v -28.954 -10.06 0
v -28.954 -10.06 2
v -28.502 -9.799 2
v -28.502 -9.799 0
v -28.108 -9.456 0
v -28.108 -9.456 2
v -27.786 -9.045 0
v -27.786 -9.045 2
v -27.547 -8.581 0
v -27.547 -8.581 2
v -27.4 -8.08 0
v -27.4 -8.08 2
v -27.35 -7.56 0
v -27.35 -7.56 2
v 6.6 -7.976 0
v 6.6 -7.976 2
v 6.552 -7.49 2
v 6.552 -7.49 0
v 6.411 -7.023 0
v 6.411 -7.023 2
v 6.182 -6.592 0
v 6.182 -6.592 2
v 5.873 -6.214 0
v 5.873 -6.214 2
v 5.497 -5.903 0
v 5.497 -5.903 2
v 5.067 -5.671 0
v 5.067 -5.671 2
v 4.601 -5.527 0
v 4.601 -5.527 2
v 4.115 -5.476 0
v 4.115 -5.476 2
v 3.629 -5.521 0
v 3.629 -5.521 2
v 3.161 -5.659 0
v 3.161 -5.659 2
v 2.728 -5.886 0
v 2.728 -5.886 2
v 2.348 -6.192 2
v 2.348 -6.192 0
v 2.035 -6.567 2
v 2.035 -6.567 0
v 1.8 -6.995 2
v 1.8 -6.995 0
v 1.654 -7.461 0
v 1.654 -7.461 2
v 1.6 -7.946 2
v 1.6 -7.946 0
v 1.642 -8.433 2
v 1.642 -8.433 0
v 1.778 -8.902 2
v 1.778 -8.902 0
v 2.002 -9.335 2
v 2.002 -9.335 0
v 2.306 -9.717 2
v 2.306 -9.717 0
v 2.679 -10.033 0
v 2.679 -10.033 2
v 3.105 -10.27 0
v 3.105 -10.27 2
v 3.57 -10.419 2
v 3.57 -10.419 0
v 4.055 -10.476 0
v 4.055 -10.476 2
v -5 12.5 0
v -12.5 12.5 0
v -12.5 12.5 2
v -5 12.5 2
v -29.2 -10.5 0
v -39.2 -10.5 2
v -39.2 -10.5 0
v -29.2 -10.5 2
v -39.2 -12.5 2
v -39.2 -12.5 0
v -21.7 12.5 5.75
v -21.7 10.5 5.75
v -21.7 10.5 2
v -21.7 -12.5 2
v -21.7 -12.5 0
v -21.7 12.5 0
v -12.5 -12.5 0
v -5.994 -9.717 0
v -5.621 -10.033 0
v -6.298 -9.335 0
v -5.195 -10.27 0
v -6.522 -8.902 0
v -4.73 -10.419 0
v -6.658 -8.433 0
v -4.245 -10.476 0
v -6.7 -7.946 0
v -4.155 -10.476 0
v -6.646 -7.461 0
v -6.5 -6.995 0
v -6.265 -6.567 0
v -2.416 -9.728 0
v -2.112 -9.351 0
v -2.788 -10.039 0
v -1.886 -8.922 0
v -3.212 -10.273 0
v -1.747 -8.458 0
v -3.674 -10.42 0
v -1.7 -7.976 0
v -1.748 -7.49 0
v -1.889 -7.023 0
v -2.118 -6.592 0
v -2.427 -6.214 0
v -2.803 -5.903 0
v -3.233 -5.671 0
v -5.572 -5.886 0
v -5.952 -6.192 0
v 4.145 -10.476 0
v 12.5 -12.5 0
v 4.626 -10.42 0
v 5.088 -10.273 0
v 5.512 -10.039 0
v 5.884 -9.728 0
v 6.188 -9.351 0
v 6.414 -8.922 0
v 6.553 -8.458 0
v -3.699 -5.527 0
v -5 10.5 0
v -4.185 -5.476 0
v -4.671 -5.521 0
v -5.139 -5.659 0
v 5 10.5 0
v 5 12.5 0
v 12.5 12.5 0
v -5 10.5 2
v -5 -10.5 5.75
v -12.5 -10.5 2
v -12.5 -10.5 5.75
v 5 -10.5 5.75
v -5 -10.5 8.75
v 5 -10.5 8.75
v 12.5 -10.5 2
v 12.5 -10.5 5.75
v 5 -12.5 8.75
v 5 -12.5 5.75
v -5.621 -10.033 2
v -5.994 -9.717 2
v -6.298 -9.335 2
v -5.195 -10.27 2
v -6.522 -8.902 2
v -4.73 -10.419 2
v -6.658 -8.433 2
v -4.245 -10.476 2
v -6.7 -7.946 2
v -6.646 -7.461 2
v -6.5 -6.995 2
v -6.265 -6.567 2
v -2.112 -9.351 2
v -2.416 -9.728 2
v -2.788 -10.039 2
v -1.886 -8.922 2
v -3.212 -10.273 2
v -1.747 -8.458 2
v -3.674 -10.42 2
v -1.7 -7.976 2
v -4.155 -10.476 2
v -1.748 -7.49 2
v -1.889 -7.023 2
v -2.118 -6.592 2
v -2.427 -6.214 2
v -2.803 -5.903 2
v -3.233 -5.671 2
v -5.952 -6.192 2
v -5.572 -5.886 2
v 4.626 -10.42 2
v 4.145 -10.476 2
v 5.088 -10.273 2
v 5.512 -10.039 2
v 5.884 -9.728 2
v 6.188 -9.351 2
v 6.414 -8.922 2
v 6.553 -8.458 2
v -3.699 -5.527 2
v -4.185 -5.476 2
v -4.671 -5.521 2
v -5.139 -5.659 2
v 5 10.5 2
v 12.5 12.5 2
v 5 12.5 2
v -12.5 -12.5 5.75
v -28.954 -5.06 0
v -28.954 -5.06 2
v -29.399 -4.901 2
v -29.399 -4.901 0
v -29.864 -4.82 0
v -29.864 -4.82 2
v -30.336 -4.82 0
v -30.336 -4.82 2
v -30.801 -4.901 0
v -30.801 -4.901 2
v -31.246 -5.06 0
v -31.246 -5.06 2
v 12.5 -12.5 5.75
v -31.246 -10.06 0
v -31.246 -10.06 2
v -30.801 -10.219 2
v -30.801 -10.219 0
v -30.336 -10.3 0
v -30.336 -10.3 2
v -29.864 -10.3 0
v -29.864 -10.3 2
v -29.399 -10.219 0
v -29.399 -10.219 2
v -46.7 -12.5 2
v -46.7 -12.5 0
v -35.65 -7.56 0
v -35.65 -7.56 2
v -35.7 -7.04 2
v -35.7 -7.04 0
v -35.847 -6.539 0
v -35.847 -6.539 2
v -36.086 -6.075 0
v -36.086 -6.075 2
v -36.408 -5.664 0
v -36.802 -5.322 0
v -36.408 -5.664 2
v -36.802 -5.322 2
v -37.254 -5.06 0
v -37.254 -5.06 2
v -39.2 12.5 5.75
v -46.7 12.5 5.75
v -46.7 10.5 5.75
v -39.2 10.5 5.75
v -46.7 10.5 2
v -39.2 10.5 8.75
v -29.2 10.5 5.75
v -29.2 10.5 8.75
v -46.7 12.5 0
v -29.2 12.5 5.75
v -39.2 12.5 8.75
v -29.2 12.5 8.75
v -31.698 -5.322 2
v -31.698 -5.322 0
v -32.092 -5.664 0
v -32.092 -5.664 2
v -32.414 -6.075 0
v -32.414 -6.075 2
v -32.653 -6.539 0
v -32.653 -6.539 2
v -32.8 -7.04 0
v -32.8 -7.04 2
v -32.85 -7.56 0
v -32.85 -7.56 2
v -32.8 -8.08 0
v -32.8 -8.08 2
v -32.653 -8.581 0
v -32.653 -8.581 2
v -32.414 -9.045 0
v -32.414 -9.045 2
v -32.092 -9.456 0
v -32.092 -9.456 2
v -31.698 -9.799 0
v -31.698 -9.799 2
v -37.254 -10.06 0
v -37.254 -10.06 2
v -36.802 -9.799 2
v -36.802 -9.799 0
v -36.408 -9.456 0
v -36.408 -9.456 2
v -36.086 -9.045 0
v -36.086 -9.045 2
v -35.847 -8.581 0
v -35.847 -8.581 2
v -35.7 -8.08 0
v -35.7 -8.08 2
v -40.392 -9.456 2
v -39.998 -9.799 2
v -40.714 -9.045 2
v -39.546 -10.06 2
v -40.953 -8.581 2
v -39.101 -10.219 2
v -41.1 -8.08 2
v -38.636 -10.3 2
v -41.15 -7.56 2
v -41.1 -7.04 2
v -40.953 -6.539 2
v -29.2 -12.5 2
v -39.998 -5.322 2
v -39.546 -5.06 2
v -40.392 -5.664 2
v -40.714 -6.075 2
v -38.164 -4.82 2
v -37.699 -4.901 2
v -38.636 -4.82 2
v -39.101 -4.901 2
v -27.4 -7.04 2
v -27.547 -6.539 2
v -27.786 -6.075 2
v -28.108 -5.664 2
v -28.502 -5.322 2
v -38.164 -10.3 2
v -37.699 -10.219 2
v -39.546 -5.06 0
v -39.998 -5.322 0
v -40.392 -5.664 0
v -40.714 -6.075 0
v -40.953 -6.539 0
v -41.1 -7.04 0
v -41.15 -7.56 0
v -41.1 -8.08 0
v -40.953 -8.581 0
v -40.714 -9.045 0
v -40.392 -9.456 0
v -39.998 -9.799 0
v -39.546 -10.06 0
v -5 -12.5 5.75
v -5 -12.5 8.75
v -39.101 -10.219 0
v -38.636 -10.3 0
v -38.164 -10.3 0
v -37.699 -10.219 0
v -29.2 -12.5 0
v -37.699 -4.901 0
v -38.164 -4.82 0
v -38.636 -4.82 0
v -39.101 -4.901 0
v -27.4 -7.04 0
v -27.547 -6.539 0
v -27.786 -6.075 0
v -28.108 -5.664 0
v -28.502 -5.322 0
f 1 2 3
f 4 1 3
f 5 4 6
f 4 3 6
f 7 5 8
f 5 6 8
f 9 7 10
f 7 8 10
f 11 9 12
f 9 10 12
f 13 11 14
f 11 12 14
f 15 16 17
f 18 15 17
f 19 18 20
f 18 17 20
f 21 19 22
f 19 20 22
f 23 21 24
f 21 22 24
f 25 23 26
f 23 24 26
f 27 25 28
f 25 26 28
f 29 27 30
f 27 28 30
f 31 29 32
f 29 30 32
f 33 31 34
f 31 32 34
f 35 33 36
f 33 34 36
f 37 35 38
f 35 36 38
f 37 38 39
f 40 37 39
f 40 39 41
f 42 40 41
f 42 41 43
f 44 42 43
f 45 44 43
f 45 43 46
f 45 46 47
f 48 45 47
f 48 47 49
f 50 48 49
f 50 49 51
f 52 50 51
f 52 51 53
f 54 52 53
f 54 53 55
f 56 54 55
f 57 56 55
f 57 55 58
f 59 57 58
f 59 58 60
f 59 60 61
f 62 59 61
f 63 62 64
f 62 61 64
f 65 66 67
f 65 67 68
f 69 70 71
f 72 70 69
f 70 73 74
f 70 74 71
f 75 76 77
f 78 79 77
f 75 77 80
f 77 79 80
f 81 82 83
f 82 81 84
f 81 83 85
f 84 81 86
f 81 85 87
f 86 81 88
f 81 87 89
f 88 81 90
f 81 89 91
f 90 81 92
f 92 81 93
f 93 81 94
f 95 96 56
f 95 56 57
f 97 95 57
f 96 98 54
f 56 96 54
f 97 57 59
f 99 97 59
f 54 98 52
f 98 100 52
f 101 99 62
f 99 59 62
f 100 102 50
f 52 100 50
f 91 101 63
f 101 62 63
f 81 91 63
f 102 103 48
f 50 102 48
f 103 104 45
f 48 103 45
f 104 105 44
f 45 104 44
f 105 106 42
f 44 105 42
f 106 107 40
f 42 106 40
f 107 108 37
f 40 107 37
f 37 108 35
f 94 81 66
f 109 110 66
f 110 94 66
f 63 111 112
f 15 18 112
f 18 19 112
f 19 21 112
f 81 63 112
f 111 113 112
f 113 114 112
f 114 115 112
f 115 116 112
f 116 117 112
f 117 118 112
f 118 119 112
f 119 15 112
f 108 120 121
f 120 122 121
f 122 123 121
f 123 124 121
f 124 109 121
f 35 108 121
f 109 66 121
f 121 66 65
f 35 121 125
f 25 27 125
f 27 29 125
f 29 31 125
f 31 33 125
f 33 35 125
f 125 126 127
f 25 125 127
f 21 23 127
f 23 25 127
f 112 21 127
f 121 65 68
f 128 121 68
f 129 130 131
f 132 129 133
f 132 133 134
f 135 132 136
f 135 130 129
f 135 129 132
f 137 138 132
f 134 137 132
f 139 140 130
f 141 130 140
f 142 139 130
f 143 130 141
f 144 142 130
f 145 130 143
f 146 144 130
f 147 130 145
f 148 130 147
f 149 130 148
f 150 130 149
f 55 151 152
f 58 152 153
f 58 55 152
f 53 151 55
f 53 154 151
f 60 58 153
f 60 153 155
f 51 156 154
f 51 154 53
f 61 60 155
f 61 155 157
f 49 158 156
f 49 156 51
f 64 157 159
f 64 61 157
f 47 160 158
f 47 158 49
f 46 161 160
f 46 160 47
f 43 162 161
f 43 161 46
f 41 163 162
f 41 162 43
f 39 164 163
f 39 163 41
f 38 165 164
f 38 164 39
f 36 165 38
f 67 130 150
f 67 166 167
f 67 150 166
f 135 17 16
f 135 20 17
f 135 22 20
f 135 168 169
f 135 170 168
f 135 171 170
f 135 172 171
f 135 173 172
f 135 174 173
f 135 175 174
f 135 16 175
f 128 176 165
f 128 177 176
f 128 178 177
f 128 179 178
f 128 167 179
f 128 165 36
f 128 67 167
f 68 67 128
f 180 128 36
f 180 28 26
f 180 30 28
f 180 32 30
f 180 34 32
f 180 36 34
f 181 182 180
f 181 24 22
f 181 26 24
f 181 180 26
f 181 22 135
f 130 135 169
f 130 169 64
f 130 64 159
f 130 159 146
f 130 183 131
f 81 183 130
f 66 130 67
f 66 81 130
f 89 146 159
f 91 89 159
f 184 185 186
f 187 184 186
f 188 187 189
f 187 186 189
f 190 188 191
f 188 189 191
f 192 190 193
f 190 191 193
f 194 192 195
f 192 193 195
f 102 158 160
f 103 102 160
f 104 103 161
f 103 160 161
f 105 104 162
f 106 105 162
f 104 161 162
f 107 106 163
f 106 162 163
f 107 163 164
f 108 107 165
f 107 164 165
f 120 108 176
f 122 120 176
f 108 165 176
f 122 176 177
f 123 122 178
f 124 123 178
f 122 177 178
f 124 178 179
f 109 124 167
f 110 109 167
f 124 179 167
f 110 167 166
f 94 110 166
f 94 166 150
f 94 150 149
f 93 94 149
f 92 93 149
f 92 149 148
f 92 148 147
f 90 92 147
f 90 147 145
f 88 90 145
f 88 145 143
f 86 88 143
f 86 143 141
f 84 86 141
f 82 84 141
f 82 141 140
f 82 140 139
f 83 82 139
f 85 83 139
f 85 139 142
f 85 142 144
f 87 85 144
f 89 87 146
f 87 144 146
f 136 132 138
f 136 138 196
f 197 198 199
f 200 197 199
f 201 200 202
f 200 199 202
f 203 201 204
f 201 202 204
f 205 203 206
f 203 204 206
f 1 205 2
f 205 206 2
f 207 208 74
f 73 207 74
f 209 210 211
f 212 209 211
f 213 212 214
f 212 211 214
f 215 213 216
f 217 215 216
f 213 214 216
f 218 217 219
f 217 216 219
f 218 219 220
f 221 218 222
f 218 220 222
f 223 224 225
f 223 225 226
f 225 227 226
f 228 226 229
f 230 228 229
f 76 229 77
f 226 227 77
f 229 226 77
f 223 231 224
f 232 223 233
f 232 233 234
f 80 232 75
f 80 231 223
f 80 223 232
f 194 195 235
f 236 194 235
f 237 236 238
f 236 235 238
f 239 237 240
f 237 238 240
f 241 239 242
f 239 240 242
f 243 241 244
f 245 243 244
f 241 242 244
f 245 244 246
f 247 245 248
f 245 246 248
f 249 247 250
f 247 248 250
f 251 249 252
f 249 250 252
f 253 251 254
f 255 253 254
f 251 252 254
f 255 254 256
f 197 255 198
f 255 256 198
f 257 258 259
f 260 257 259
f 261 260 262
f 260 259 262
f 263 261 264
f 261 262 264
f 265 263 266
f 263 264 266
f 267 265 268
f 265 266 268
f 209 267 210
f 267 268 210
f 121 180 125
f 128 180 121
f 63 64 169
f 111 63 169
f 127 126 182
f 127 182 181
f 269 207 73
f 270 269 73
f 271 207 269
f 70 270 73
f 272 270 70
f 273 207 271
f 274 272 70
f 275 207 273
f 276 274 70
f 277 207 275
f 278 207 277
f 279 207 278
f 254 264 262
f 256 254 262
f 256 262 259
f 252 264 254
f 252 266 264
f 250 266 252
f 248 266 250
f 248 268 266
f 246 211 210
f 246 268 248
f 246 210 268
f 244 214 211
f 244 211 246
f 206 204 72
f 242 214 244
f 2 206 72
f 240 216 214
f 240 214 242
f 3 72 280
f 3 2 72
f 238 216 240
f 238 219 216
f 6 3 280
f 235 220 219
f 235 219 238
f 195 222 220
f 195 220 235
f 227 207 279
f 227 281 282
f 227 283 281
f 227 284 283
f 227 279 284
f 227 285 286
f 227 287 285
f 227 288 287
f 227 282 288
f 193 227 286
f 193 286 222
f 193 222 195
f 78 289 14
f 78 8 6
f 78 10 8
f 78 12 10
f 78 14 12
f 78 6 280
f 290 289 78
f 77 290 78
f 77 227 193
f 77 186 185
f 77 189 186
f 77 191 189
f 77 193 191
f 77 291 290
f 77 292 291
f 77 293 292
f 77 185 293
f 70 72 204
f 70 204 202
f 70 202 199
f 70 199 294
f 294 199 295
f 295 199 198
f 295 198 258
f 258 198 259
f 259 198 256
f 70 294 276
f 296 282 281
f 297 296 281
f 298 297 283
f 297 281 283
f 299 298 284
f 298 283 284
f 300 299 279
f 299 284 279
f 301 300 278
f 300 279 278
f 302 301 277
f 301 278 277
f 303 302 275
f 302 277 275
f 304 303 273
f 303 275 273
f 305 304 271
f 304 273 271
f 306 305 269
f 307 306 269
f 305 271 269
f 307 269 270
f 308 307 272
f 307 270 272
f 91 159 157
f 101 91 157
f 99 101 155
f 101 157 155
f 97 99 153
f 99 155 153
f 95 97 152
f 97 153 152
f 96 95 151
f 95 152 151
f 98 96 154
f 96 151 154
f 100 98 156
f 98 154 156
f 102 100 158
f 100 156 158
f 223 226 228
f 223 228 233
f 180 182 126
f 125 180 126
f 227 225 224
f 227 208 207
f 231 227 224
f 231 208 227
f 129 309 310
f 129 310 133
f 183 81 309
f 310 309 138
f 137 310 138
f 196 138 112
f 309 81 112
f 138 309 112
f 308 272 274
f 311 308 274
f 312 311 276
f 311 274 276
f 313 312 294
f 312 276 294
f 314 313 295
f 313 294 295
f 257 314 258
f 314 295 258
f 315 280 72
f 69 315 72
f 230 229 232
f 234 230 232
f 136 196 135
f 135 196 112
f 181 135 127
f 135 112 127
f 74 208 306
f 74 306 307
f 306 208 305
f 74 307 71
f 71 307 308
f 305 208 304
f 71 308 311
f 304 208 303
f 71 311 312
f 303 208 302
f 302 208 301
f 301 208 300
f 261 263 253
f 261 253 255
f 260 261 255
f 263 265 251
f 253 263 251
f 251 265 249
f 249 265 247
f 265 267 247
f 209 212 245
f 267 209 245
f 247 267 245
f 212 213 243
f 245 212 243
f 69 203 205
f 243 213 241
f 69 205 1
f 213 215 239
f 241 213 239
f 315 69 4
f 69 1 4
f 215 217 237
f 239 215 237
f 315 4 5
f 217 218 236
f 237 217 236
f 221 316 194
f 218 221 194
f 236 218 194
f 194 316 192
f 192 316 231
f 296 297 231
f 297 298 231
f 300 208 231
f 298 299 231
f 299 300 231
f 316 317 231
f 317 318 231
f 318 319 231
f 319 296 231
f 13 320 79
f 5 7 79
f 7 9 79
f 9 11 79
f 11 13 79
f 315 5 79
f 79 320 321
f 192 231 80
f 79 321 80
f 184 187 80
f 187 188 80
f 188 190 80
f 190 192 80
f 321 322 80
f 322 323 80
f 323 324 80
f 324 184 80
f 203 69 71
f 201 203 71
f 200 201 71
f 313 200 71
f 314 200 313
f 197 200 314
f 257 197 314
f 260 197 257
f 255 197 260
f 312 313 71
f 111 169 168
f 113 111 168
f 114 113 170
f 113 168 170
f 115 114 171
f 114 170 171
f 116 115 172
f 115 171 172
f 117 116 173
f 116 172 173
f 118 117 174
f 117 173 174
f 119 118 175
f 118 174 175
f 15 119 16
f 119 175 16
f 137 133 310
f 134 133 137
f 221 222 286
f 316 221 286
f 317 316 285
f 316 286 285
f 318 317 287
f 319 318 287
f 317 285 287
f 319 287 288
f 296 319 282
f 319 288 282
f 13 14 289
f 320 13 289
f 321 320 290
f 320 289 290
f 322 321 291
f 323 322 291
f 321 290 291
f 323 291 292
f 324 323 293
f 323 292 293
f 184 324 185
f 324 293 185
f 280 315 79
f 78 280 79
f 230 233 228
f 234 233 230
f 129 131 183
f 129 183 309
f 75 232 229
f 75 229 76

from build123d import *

# Parameters (mm, degrees)
F0_W      = 25
F0_H      = 2
F0_H_2    = 21
F1_DEPTH  = 2
F2_W      = 25
F2_H      = 2
F4_DEPTH  = 3.75
F3_W      = 25
F3_H      = 2
F5_W      = 10
F5_H      = 2
F7_DEPTH  = 2.001
F8_W      = 10
F8_H      = 2
F9_DEPTH  = 3
F10_W     = 10
F10_H     = 2
F11_DEPTH = 3
F13_DEPTH = 2
F15_DEPTH = 2.001
F17_DEPTH = 2.001


# Not quite as in the source:
# - a feature names something its author has since deleted; it is built from what else it names


with BuildPart() as f1:
    # F0 (on Top) → F1 (new body)
    with BuildSketch(Plane.XY):
        with Locations((-34.2000119388, 11.4999952018)):
            Rectangle(F0_W, F0_H)
        with Locations((-34.2000119388, -4.7982e-06)):
            Rectangle(F0_W, F0_H_2)
        with Locations((-34.2000119388, -11.5000047982)):
            Rectangle(F0_W, F0_H)
    extrude(amount=F1_DEPTH)

    # F2 (on face) → F4 (join)
    with BuildSketch(Plane.XY.offset(2)):
        with Locations((-34.2000119388, 11.4999952018)):
            Rectangle(F2_W, F2_H)
    extrude(amount=F4_DEPTH)

    # F5 (on face) → F7 (cut, through all)
    with BuildSketch(Plane.XY.offset(2)):
        with Locations((-34.2000119388, -11.5000047982)):
            Rectangle(F5_W, F5_H)
    extrude(amount=-F7_DEPTH, mode=Mode.SUBTRACT)

    # F8 (on face) → F9 (join)
    with BuildSketch(Plane.XY.offset(5.75)):
        with Locations((-34.2000119388, 11.4999952018)):
            Rectangle(F8_W, F8_H)
    extrude(amount=F9_DEPTH)

    # F16 (on face) → F17 (cut, through all)
    with BuildSketch(Plane.XY.offset(2)):
        with BuildLine():
            ThreePointArc((-39.5456558625, -5.0601771846), (-41.1500119388, -7.5601771846), (-39.5456558625, -10.0601771846))
            Line((-39.5456558625, -10.0601771846), (-37.2543680151, -10.0601771846))
            ThreePointArc((-37.2543680151, -10.0601771846), (-36.0855983208, -9.045434605), (-35.6500119388, -7.5601771846))
            ThreePointArc((-35.6500119388, -7.5601771846), (-36.0855983208, -6.0749197642), (-37.2543680151, -5.0601771846))
            Line((-37.2543680151, -5.0601771846), (-39.5456558625, -5.0601771846))
        make_face()
        with BuildLine():
            ThreePointArc((-37.2543680151, -5.0601771846), (-38.4000119388, -4.8101771846), (-39.5456558625, -5.0601771846))
            Line((-39.5456558625, -5.0601771846), (-37.2543680151, -5.0601771846))
        make_face()
        with BuildLine():
            Line((-37.2543680151, -10.0601771846), (-39.5456558625, -10.0601771846))
            ThreePointArc((-39.5456558625, -10.0601771846), (-38.4000119388, -10.3101771846), (-37.2543680151, -10.0601771846))
        make_face()
        with BuildLine():
            Line((-28.9543680151, -10.0601771846), (-31.2456558625, -10.0601771846))
            ThreePointArc((-31.2456558625, -10.0601771846), (-30.1000119388, -10.3101771846), (-28.9543680151, -10.0601771846))
        make_face()
        with BuildLine():
            ThreePointArc((-31.2456558625, -5.0601771846), (-32.8500119388, -7.5601771846), (-31.2456558625, -10.0601771846))
            Line((-31.2456558625, -10.0601771846), (-28.9543680151, -10.0601771846))
            ThreePointArc((-28.9543680151, -10.0601771846), (-27.7855983208, -9.045434605), (-27.3500119388, -7.5601771846))
            ThreePointArc((-27.3500119388, -7.5601771846), (-27.7855983208, -6.0749197642), (-28.9543680151, -5.0601771846))
            Line((-28.9543680151, -5.0601771846), (-31.2456558625, -5.0601771846))
        make_face()
        with BuildLine():
            ThreePointArc((-28.9543680151, -5.0601771846), (-30.1000119388, -4.8101771846), (-31.2456558625, -5.0601771846))
            Line((-31.2456558625, -5.0601771846), (-28.9543680151, -5.0601771846))
        make_face()
    extrude(amount=-F17_DEPTH, mode=Mode.SUBTRACT)


with BuildPart() as f1b:
    # F0 (on Top) → F1, piece 2 (new body)
    with BuildSketch(Plane.XY):
        with Locations((0, -11.5)):
            Rectangle(F0_W, F0_H)
        Rectangle(F0_W, F0_H_2)
        with Locations((0, 11.5)):
            Rectangle(F0_W, F0_H)
    extrude(amount=F1_DEPTH)

    # F3 (on face) → F4, piece 2 (join)
    with BuildSketch(Plane.XY.offset(2)):
        with Locations((0, -11.5)):
            Rectangle(F3_W, F3_H)
    extrude(amount=F4_DEPTH)

    # F10 (on face) → F11 (join)
    with BuildSketch(Plane.XY.offset(5.75)):
        with Locations((0, -11.5)):
            Rectangle(F10_W, F10_H)
    extrude(amount=F11_DEPTH)

    # F12 (on face) → F13 (cut)
    with BuildSketch(Plane(origin=(0, 12.5, 0), x_dir=(-1, 0, 0), z_dir=(0, 1, 0))):
        Polygon((-5, 2), (-5, 1), (0, 1), (5, 1), (5, 2), align=None)
        Polygon((0, 1), (-5, 1), (-5, 0), (5, 0), (5, 1), align=None)
    extrude(amount=-F13_DEPTH, mode=Mode.SUBTRACT)

    # F14 (on face) → F15 (cut, through all)
    with BuildSketch(Plane.XY.offset(2)):
        with BuildLine():
            Line((-4.2448268481, -10.4756355286), (-4.1551731519, -10.4756355286))
            ThreePointArc((-4.1551731519, -10.4756355286), (-2.4164547777, -9.7278840301), (-1.7, -7.9760374501))
            ThreePointArc((-1.7, -7.9760374501), (-5.95184658, -6.1924922278), (-4.2448268481, -10.4756355286))
        make_face()
        with BuildLine():
            Line((4.0551731519, -10.4756355286), (4.1448268481, -10.4756355286))
            ThreePointArc((4.1448268481, -10.4756355286), (5.8835452223, -9.7278840301), (6.6, -7.9760374501))
            ThreePointArc((6.6, -7.9760374501), (2.34815342, -6.1924922278), (4.0551731519, -10.4756355286))
        make_face()
    extrude(amount=-F15_DEPTH, mode=Mode.SUBTRACT)


solid = Compound([f1.part, f1b.part])
